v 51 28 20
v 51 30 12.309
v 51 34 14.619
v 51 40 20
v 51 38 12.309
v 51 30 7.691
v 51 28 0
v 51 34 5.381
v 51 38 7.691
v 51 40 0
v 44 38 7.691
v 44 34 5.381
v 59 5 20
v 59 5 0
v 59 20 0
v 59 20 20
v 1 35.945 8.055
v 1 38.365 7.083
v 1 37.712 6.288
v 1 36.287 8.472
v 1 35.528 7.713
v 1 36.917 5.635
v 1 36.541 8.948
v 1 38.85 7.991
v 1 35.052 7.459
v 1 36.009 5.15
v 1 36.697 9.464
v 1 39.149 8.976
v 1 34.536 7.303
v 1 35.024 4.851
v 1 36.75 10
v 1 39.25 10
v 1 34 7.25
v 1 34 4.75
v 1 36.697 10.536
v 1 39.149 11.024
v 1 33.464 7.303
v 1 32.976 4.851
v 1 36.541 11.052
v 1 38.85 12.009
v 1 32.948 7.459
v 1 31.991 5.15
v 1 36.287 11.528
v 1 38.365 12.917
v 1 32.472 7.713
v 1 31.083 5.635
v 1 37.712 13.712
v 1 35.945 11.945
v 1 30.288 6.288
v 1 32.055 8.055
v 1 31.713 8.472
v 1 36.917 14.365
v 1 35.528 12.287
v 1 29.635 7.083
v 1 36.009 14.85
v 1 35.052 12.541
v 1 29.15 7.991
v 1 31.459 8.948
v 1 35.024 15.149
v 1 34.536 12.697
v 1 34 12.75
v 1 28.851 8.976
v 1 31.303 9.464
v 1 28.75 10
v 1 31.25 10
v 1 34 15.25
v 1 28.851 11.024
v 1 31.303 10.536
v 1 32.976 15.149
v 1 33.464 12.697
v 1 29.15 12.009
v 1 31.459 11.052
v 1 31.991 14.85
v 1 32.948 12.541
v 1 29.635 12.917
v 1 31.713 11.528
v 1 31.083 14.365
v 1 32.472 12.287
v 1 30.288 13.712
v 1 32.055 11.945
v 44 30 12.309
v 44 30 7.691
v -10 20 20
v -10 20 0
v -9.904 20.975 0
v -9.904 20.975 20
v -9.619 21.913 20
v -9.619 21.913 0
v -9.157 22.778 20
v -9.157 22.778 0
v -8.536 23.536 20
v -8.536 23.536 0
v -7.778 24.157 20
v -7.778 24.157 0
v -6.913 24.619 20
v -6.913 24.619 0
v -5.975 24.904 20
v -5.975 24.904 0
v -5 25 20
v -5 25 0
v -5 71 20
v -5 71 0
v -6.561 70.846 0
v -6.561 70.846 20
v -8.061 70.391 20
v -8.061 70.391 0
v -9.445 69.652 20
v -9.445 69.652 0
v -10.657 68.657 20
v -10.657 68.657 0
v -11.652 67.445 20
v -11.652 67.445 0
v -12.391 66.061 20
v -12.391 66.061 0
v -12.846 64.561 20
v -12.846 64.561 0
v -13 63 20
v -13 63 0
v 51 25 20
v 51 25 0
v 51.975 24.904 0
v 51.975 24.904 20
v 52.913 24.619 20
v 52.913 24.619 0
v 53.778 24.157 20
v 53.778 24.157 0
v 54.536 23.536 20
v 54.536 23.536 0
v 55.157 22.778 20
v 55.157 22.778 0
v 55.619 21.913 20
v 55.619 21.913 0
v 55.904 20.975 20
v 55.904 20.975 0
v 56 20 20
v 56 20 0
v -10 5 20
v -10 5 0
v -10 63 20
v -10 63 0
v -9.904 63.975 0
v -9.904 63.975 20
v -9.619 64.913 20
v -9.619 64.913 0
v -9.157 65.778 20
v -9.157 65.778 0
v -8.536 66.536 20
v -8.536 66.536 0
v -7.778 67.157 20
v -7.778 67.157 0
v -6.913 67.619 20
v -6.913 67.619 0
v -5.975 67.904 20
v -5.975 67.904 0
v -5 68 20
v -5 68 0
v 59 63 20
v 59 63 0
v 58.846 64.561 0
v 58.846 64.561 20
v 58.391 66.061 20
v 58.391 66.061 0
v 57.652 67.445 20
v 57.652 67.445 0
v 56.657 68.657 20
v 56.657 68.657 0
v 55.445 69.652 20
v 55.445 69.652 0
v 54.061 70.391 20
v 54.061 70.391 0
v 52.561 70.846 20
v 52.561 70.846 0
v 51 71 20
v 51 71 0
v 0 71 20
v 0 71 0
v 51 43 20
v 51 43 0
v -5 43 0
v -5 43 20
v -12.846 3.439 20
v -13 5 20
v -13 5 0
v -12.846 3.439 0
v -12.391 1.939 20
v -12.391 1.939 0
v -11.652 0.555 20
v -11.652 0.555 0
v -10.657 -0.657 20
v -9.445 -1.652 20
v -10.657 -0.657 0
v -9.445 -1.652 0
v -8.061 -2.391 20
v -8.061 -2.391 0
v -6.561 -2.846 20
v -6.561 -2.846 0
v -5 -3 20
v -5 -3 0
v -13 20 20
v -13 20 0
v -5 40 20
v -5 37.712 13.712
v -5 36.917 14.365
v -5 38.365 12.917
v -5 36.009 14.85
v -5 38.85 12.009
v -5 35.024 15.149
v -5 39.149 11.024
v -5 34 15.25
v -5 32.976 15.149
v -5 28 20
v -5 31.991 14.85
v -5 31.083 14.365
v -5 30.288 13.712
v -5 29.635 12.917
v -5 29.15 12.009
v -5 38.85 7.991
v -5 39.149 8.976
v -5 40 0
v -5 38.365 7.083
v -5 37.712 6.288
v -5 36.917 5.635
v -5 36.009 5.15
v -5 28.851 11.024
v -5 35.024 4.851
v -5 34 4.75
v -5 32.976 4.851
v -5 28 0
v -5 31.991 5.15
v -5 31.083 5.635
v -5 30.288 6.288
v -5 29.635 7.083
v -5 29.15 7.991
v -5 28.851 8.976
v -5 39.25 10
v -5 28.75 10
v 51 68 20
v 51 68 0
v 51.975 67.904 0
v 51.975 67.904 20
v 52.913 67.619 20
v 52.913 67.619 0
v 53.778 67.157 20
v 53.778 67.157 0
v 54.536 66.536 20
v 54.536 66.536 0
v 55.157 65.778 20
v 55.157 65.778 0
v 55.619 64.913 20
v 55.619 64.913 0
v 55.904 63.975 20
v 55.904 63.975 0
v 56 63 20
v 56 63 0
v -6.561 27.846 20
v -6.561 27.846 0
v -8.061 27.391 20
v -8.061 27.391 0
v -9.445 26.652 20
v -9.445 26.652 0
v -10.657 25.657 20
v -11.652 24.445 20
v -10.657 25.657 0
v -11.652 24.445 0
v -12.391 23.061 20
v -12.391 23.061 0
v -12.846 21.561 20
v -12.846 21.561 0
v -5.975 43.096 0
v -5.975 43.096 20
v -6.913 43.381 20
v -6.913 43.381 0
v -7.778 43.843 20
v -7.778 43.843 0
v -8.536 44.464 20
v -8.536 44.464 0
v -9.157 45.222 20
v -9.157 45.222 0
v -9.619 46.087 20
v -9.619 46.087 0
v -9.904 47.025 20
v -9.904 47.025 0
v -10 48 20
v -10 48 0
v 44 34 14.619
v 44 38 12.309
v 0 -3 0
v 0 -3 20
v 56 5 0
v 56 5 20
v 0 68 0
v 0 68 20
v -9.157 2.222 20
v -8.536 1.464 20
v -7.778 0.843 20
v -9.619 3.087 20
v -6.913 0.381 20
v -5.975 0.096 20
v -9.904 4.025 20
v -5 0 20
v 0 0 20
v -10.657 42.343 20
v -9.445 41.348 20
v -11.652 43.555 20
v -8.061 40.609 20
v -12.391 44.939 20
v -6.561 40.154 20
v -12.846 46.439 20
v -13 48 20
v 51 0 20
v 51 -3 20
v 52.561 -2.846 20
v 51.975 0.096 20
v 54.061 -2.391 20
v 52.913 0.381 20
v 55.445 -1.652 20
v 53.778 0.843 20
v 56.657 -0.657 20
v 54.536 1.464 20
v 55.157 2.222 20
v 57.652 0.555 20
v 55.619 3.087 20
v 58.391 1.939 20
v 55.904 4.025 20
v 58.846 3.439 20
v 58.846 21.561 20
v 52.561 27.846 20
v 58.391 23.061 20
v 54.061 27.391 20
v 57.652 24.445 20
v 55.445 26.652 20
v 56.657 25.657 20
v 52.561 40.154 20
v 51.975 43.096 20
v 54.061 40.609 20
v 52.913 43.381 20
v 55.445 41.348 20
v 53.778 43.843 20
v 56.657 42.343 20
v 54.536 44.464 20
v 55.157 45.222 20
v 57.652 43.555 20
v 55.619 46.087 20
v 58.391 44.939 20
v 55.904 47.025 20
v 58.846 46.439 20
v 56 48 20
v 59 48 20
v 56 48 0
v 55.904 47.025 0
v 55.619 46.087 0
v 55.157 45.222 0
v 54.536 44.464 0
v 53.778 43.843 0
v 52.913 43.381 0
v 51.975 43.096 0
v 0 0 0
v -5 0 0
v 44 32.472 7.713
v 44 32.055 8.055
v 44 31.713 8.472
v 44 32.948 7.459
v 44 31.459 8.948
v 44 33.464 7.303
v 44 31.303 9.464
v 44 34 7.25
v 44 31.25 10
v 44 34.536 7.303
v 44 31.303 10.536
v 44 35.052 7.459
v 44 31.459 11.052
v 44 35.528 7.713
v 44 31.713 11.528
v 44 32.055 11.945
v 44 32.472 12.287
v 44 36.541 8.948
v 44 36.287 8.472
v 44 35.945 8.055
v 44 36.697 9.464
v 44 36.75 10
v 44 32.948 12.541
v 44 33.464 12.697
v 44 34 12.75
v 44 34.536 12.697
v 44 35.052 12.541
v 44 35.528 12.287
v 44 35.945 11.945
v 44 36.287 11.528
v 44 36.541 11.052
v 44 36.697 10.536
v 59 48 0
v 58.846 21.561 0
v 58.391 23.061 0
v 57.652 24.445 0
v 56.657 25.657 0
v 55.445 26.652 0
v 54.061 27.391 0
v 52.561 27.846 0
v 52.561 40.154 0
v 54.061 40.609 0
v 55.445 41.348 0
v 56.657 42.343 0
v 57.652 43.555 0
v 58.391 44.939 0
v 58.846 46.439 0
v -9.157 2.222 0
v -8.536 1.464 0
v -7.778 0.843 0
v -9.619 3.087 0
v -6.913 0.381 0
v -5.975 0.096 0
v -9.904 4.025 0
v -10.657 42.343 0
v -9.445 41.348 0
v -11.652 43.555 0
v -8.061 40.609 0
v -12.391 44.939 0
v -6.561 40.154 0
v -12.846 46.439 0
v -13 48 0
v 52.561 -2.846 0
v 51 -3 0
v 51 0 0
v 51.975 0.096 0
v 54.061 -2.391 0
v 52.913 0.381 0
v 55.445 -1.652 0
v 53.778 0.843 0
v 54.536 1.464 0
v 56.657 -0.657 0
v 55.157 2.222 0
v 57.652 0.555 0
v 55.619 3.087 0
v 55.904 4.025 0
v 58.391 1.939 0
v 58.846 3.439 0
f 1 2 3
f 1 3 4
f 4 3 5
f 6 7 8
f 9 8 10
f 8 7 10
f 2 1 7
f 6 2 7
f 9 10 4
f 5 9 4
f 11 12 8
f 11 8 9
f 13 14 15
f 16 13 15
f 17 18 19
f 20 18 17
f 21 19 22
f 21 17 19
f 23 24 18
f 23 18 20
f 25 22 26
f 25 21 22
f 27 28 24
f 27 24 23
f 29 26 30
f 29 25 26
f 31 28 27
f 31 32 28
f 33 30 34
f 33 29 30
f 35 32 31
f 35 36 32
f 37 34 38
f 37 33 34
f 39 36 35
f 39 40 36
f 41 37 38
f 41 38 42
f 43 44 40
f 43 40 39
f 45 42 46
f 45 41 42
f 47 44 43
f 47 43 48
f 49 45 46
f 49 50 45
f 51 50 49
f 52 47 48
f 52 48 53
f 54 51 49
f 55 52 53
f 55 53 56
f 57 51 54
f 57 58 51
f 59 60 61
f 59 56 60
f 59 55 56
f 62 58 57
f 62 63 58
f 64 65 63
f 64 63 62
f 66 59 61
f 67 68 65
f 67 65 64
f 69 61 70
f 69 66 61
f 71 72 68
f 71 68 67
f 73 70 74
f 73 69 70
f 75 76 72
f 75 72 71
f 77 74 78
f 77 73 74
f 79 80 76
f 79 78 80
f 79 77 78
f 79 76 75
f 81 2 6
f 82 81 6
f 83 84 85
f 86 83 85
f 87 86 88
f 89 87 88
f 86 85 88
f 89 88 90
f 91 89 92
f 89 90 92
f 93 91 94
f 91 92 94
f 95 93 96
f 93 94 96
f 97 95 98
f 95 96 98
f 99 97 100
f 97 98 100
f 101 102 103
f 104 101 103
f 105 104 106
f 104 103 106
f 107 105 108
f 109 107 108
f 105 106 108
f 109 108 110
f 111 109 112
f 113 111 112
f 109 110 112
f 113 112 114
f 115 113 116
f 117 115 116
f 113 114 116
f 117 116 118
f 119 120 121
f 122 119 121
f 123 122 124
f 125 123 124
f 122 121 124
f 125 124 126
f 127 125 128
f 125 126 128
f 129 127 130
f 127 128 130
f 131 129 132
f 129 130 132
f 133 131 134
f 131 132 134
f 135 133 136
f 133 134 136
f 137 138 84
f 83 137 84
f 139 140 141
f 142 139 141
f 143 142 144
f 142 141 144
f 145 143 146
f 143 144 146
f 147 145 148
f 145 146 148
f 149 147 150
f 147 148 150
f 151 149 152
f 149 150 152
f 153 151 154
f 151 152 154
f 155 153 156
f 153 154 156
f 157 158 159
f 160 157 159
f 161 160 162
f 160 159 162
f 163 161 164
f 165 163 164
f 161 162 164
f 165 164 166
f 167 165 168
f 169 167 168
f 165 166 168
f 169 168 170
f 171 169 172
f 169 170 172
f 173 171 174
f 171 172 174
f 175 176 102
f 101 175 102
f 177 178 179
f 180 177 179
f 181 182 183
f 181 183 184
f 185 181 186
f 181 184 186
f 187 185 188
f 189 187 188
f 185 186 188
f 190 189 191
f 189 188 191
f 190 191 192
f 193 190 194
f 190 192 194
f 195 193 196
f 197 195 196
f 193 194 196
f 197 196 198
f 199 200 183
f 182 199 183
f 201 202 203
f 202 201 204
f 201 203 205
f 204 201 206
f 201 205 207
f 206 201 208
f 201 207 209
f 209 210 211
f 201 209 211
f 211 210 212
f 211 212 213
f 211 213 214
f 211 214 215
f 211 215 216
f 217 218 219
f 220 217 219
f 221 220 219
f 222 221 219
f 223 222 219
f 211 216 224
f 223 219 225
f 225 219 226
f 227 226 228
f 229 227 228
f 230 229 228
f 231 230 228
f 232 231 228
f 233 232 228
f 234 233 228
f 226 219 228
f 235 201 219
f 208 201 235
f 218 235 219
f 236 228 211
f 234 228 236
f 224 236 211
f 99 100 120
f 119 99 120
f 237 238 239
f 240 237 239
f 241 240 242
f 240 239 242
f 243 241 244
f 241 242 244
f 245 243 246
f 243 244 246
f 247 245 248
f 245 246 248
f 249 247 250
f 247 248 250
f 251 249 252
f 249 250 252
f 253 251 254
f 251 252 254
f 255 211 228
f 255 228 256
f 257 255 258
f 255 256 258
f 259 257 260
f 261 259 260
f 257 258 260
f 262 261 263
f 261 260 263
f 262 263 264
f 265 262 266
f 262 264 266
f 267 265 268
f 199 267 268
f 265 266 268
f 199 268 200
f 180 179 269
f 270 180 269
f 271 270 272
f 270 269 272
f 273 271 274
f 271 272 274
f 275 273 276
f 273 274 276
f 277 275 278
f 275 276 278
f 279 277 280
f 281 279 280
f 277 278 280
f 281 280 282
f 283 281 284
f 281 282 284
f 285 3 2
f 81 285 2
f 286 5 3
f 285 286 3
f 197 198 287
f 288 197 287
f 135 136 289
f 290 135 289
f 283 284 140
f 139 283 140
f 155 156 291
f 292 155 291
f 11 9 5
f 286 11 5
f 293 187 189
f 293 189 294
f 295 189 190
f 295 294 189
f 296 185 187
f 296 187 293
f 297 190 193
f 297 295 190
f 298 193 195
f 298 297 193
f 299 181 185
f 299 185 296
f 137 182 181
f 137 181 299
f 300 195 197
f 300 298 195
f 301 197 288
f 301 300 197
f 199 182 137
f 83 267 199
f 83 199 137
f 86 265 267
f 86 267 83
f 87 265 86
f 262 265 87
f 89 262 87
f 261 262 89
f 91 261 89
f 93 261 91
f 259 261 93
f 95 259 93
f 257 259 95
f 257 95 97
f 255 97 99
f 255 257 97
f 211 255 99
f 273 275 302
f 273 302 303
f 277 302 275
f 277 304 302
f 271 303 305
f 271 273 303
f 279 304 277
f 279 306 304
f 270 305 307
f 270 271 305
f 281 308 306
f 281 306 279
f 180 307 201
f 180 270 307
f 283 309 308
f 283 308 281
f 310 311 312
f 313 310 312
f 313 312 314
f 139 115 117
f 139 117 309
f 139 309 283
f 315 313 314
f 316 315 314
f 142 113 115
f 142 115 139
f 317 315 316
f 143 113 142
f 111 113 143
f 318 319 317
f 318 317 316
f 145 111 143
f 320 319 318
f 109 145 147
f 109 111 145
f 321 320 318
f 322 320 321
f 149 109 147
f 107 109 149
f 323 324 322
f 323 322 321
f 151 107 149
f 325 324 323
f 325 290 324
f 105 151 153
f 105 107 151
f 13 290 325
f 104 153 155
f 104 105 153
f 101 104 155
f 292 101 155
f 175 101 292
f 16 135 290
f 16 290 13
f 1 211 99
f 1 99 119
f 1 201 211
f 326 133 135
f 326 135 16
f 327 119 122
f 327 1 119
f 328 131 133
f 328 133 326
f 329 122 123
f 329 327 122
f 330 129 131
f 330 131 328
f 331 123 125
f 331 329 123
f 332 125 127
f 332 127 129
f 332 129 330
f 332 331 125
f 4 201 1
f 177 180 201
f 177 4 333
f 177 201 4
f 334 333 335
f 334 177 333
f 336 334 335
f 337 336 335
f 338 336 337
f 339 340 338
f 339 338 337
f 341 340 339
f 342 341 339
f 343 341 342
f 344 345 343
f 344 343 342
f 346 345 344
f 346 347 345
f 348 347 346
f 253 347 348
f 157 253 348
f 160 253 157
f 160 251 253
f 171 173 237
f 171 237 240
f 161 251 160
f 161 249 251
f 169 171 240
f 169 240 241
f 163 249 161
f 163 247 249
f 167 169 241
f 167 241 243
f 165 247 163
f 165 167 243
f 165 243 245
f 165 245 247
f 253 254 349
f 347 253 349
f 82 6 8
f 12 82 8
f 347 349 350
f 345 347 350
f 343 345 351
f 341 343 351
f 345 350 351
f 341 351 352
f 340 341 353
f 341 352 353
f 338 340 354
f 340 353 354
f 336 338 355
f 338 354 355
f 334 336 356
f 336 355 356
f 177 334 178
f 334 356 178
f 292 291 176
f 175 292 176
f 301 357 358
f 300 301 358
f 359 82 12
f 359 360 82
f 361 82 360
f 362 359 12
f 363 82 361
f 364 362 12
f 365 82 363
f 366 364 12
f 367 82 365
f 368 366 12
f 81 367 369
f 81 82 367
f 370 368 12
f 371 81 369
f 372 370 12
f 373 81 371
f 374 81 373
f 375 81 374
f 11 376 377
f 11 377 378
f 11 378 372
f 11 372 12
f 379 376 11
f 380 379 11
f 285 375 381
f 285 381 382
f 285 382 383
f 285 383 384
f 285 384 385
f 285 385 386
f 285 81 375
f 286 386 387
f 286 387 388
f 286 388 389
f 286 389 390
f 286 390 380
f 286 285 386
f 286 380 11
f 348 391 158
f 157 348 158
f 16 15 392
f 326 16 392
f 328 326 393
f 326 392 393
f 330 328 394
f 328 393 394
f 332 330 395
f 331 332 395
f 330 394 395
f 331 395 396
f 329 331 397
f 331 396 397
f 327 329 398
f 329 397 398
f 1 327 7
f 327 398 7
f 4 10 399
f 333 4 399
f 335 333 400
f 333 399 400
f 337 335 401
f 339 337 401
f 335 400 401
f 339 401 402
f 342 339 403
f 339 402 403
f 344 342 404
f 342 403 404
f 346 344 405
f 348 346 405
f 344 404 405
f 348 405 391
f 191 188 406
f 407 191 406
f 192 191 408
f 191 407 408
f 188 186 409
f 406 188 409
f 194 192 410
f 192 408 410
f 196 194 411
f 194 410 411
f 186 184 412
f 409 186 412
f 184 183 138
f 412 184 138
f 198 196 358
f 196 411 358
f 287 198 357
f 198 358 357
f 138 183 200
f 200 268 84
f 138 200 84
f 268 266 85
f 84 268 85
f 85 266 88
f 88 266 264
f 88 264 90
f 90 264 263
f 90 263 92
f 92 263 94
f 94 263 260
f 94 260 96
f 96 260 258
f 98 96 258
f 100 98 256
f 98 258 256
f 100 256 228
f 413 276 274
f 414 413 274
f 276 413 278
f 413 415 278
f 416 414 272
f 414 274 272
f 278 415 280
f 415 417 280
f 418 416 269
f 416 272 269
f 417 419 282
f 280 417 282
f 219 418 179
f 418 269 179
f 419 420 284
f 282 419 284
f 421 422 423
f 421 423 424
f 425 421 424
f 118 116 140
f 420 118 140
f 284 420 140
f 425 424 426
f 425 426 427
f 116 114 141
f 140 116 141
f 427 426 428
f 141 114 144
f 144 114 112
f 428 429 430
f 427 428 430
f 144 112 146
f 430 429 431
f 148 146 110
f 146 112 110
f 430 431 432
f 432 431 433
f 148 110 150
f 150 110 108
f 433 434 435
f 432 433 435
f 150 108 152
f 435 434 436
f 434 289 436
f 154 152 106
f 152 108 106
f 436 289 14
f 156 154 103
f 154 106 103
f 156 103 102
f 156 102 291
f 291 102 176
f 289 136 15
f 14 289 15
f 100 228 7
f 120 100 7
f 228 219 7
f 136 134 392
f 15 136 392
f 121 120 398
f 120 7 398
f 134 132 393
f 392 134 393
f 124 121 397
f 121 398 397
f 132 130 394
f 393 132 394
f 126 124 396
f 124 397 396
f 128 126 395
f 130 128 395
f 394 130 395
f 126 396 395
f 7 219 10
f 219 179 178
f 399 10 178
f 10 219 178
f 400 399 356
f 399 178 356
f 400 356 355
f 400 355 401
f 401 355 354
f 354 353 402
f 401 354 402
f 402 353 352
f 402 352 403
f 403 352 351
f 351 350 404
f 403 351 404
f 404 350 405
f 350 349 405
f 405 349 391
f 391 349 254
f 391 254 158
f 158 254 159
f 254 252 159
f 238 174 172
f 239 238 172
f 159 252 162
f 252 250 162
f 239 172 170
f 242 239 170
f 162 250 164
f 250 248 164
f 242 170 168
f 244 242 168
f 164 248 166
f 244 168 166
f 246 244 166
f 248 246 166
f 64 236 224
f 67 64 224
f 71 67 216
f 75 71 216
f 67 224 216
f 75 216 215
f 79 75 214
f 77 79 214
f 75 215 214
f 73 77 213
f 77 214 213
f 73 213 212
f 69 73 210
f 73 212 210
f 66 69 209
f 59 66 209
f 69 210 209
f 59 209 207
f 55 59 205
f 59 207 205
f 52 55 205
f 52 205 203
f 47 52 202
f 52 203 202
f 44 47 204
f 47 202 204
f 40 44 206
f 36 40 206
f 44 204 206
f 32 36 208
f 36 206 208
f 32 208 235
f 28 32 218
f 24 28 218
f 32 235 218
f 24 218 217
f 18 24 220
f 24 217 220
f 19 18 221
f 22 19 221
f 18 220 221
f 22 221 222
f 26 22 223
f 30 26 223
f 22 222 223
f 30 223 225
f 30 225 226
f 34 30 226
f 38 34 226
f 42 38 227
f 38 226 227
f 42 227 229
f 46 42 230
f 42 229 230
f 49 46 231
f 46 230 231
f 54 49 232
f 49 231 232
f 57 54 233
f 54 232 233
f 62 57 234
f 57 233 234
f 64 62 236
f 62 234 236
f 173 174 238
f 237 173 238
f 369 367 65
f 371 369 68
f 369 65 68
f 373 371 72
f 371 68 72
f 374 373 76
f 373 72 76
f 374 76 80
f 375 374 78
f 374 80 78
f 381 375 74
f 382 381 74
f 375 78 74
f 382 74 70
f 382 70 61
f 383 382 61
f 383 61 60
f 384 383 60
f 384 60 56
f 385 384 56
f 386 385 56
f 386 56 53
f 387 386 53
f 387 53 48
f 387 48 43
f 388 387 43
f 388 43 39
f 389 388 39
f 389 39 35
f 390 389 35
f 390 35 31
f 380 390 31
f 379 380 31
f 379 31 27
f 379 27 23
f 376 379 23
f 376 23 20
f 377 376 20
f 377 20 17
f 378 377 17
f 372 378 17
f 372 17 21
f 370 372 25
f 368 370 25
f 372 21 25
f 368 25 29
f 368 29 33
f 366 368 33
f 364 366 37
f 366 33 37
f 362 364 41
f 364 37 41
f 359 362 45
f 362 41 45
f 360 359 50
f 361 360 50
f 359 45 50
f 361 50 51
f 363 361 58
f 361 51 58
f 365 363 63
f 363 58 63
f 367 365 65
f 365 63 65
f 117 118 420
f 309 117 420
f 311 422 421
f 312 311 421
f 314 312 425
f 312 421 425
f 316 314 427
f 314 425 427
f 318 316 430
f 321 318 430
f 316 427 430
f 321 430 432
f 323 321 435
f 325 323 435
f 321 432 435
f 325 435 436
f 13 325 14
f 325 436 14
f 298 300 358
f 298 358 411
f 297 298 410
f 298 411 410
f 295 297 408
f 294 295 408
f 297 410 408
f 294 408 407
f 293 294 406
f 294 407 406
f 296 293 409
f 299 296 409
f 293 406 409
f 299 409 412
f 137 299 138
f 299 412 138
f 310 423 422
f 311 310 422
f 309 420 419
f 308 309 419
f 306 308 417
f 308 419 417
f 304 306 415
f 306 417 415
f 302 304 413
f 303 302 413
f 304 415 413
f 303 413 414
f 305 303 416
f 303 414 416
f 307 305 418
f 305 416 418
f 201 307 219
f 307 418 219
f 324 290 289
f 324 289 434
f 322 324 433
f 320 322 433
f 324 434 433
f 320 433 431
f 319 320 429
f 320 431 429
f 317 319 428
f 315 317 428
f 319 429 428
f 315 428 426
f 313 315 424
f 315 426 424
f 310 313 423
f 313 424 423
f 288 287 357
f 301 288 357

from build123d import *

# Parameters (mm, degrees)
F1_DEPTH = 20
F2_R     = 5.25
F3_DEPTH = 6
F5_DEPTH = 7
F6_R     = 2.75
F7_DEPTH = 58.001


with BuildPart() as f1:
    # F0 (on Top) → F1 (new body)
    with BuildSketch(Plane.XY):
        with BuildLine():
            ThreePointArc((-5, 0), (-8.535534, 1.464466), (-10, 5))
            Line((-10, 5), (-10, 20))
            ThreePointArc((-10, 20), (-8.535534, 23.535534), (-5, 25))
            Line((-5, 25), (51, 25))
            ThreePointArc((51, 25), (54.535534, 23.535534), (56, 20))
            Line((56, 20), (56, 5))
            ThreePointArc((56, 5), (54.535534, 1.464466), (51, 0))
            Line((51, 0), (51, -3))
            ThreePointArc((51, -3), (56.656854, -0.656854), (59, 5))
            Line((59, 5), (59, 20))
            ThreePointArc((59, 20), (56.656854, 25.656854), (51, 28))
            Line((51, 28), (51, 40))
            ThreePointArc((51, 40), (56.656854, 42.343146), (59, 48))
            Line((59, 48), (59, 63))
            ThreePointArc((59, 63), (56.656854, 68.656854), (51, 71))
            Line((51, 71), (51, 68))
            ThreePointArc((51, 68), (54.535534, 66.535534), (56, 63))
            Line((56, 63), (56, 48))
            ThreePointArc((56, 48), (54.535534, 44.464466), (51, 43))
            Line((51, 43), (-5, 43))
            ThreePointArc((-5, 43), (-8.535534, 44.464466), (-10, 48))
            Line((-10, 48), (-10, 63))
            ThreePointArc((-10, 63), (-8.535534, 66.535534), (-5, 68))
            Line((-5, 68), (0, 68))
            Line((0, 68), (0, 71))
            Line((0, 71), (-5, 71))
            ThreePointArc((-5, 71), (-10.656854, 68.656854), (-13, 63))
            Line((-13, 63), (-13, 48))
            ThreePointArc((-13, 48), (-10.656854, 42.343146), (-5, 40))
            Line((-5, 40), (-5, 28))
            ThreePointArc((-5, 28), (-10.656854, 25.656854), (-13, 20))
            Line((-13, 20), (-13, 5))
            ThreePointArc((-13, 5), (-10.656854, -0.656854), (-5, -3))
            Line((-5, -3), (0, -3))
            Line((0, -3), (0, 0))
            Line((0, 0), (-5, 0))
        make_face()
    extrude(amount=F1_DEPTH)

    # F2 (on face) → F3 (cut)
    with BuildSketch(Plane(origin=(-5, 0, 0), x_dir=(0, -1, 0), z_dir=(-1, 0, 0))):
        with Locations((-34, 10)):
            Circle(F2_R)
    extrude(amount=-F3_DEPTH, mode=Mode.SUBTRACT)

    # F4 (on face) → F5 (cut)
    with BuildSketch(Plane.YZ.offset(51)):
        Polygon((38, 7.690599), (38, 12.309401), (34, 14.618802), (30, 12.309401), (30, 7.690599), (34, 5.381198), align=None)
    extrude(amount=-F5_DEPTH, mode=Mode.SUBTRACT)

    # F6 (on face) → F7 (cut, through all)
    with BuildSketch(Plane(origin=(1, 0, 0), x_dir=(0, -1, 0), z_dir=(-1, 0, 0))):
        with Locations((-34, 10)):
            Circle(F6_R)
    extrude(amount=-F7_DEPTH, mode=Mode.SUBTRACT)


solid = f1.part
